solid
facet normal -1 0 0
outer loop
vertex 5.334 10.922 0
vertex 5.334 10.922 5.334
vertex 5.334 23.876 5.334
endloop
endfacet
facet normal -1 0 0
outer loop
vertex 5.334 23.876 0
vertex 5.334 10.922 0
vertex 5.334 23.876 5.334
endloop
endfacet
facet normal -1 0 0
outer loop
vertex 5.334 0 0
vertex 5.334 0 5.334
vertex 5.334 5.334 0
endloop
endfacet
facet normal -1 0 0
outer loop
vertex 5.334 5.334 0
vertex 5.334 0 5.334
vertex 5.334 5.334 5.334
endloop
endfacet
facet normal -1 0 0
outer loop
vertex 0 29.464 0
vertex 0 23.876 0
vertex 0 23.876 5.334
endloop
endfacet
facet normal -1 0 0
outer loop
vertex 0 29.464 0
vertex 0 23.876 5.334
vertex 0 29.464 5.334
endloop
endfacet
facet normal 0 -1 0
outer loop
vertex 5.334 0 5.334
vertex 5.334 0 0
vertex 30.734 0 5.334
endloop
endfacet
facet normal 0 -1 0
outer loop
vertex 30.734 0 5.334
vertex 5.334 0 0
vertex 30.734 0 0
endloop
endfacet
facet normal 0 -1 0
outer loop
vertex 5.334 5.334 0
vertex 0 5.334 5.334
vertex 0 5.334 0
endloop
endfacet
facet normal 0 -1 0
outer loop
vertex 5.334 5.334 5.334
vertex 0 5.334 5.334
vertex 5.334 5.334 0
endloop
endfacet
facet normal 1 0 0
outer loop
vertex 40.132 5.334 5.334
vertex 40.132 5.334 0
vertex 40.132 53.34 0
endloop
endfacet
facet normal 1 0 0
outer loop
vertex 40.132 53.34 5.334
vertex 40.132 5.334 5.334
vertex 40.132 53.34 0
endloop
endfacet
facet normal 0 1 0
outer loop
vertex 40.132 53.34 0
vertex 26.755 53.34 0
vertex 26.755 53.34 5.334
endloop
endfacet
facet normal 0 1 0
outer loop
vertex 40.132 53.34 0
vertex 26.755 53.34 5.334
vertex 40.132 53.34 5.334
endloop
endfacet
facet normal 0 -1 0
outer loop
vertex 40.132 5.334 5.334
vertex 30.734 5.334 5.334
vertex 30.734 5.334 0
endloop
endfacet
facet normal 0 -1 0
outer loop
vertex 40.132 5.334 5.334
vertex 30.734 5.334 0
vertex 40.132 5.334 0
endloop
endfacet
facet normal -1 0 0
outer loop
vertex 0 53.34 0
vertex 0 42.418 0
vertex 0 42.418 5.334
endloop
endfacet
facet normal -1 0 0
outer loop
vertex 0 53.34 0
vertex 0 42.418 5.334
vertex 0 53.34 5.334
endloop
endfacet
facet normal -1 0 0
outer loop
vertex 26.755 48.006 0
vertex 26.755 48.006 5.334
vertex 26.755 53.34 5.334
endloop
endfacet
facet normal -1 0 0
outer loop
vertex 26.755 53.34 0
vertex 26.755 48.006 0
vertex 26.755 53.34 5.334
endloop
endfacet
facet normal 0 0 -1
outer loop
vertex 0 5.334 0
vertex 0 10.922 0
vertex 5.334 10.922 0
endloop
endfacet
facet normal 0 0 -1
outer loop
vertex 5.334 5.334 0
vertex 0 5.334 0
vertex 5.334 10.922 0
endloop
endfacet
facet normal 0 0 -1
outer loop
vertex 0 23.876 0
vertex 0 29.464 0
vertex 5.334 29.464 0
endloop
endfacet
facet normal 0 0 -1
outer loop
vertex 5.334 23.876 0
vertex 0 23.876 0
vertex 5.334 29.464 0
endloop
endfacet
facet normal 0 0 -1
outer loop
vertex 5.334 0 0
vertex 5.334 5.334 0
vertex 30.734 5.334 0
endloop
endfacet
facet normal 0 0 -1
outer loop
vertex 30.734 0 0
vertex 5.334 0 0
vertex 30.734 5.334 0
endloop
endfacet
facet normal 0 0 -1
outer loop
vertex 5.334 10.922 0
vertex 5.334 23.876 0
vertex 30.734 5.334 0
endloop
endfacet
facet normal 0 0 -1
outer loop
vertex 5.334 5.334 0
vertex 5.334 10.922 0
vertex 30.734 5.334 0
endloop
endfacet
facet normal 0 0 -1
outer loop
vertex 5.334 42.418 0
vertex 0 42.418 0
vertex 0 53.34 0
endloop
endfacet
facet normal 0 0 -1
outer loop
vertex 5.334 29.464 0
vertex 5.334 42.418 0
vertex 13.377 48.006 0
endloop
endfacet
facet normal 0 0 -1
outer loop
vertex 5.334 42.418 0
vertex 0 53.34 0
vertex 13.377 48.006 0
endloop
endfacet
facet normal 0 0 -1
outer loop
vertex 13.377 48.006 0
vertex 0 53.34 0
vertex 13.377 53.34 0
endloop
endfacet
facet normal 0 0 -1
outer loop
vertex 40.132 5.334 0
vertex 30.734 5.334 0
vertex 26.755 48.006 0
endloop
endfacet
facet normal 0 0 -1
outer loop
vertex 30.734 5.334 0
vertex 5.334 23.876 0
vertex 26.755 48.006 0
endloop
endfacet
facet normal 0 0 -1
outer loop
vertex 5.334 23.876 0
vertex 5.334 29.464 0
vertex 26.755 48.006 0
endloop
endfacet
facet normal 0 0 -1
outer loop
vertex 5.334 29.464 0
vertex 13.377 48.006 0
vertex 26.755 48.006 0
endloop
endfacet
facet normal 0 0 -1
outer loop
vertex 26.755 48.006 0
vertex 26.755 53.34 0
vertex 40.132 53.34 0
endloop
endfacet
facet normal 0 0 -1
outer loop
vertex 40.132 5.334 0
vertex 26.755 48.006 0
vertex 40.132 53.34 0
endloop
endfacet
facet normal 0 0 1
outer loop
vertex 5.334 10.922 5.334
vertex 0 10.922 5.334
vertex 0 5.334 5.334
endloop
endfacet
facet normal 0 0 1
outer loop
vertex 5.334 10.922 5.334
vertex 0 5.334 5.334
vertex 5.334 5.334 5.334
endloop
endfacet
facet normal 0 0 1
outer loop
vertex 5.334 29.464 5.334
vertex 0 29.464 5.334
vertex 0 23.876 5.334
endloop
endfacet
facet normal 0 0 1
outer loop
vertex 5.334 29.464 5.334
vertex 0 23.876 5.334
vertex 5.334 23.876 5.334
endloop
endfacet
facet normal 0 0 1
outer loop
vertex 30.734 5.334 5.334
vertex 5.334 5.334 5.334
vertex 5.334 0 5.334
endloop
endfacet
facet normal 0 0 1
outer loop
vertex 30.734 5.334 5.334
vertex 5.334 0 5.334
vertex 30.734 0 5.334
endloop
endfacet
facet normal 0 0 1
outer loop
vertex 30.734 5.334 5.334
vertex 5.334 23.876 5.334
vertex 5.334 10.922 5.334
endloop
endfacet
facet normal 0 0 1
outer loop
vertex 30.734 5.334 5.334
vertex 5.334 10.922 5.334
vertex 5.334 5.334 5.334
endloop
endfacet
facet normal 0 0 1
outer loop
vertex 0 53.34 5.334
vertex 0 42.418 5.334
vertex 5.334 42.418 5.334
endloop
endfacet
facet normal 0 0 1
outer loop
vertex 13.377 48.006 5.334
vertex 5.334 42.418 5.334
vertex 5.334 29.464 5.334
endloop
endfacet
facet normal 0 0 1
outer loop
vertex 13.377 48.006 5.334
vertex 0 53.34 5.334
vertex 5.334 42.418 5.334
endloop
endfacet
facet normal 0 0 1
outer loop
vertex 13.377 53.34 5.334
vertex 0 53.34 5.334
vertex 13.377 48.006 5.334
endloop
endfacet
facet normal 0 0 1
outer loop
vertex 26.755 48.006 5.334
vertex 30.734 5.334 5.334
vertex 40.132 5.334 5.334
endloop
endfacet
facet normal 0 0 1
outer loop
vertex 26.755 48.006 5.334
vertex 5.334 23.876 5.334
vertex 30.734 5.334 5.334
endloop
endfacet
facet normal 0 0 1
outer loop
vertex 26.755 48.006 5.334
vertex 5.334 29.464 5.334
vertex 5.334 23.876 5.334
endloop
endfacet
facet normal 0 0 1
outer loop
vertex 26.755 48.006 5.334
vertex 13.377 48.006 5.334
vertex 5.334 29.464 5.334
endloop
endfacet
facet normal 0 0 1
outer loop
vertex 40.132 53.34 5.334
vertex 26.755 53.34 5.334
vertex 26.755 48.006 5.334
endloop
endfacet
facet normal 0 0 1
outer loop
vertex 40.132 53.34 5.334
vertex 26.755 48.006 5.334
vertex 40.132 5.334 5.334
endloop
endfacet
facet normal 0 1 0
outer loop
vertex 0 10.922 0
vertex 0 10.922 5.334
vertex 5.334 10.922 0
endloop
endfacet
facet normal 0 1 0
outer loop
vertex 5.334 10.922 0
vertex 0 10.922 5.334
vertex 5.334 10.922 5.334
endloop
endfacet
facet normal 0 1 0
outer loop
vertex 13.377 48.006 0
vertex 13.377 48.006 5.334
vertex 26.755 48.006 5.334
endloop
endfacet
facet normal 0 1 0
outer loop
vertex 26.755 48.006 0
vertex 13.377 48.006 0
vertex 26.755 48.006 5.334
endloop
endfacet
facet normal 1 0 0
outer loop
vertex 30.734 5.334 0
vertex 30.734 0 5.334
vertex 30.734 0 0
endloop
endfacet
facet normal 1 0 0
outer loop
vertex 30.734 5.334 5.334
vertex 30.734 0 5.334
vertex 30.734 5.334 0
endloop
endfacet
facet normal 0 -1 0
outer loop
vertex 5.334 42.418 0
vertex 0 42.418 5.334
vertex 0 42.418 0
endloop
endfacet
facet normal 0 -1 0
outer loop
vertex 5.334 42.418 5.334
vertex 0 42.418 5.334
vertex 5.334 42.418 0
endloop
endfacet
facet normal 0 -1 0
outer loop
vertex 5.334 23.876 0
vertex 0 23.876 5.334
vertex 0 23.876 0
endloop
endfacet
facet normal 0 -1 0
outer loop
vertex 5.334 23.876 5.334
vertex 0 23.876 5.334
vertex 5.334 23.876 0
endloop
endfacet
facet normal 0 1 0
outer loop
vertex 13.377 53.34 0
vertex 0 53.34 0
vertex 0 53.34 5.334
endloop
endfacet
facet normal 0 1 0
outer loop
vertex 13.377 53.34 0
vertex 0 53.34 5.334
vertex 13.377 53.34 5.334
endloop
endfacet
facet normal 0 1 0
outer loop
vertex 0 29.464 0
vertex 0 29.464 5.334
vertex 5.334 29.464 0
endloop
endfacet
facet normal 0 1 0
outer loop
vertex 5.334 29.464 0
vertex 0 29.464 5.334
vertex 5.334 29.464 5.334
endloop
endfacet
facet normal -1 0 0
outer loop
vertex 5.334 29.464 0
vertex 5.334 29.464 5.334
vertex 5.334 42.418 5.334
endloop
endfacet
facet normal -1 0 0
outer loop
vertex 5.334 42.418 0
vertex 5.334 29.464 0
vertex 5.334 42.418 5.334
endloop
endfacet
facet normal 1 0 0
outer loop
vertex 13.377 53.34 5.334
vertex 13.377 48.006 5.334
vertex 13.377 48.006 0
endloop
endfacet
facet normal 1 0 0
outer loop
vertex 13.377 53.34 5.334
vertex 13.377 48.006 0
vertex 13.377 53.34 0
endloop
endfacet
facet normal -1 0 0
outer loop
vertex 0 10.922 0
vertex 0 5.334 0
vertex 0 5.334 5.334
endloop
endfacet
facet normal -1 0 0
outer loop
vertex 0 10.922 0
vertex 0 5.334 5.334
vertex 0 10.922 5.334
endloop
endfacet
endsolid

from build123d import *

# Parameters (mm, degrees)
SKETCH1_W           = 40.132
SKETCH1_H           = 53.34
BOSS_EXTRUDE1_DEPTH = 5.334
SKETCH3_W           = 5.334
SKETCH3_H           = 5.334
SKETCH3_W_2         = 9.398
CUT_EXTRUDE1_DEPTH  = 6.334
SKETCH4_W           = 5.334
SKETCH4_H           = 12.954
CUT_EXTRUDE2_DEPTH  = 6.334
SKETCH5_W           = 13.377333334
SKETCH5_H           = 5.334
CUT_EXTRUDE3_DEPTH  = 6.334


with BuildPart() as part:
    # Sketch1 → Boss-Extrude1 (new body)
    with BuildSketch(Plane.XY):
        with Locations((20.066, 26.67)):
            Rectangle(SKETCH1_W, SKETCH1_H)
    extrude(amount=BOSS_EXTRUDE1_DEPTH)

    # Sketch3 → Cut-Extrude1 (cut, through all)
    with BuildSketch(Plane.XY.offset(5.334)):
        with Locations((2.667, 2.667)):
            Rectangle(SKETCH3_W, SKETCH3_H)
        with Locations((35.433, 2.667)):
            Rectangle(SKETCH3_W_2, SKETCH3_H)
    extrude(amount=-CUT_EXTRUDE1_DEPTH, mode=Mode.SUBTRACT)

    # Sketch4 → Cut-Extrude2 (cut, through all)
    with BuildSketch(Plane.XY.offset(5.334)):
        with Locations((2.667, 35.941)):
            Rectangle(SKETCH4_W, SKETCH4_H)
        with Locations((2.667, 17.399)):
            Rectangle(SKETCH4_W, SKETCH4_H)
    extrude(amount=-CUT_EXTRUDE2_DEPTH, mode=Mode.SUBTRACT)

    # Sketch5 → Cut-Extrude3 (cut, through all)
    with BuildSketch(Plane.XY.offset(5.334)):
        with Locations((20.066, 50.673)):
            Rectangle(SKETCH5_W, SKETCH5_H)
    extrude(amount=-CUT_EXTRUDE3_DEPTH, mode=Mode.SUBTRACT)


solid = part.part
